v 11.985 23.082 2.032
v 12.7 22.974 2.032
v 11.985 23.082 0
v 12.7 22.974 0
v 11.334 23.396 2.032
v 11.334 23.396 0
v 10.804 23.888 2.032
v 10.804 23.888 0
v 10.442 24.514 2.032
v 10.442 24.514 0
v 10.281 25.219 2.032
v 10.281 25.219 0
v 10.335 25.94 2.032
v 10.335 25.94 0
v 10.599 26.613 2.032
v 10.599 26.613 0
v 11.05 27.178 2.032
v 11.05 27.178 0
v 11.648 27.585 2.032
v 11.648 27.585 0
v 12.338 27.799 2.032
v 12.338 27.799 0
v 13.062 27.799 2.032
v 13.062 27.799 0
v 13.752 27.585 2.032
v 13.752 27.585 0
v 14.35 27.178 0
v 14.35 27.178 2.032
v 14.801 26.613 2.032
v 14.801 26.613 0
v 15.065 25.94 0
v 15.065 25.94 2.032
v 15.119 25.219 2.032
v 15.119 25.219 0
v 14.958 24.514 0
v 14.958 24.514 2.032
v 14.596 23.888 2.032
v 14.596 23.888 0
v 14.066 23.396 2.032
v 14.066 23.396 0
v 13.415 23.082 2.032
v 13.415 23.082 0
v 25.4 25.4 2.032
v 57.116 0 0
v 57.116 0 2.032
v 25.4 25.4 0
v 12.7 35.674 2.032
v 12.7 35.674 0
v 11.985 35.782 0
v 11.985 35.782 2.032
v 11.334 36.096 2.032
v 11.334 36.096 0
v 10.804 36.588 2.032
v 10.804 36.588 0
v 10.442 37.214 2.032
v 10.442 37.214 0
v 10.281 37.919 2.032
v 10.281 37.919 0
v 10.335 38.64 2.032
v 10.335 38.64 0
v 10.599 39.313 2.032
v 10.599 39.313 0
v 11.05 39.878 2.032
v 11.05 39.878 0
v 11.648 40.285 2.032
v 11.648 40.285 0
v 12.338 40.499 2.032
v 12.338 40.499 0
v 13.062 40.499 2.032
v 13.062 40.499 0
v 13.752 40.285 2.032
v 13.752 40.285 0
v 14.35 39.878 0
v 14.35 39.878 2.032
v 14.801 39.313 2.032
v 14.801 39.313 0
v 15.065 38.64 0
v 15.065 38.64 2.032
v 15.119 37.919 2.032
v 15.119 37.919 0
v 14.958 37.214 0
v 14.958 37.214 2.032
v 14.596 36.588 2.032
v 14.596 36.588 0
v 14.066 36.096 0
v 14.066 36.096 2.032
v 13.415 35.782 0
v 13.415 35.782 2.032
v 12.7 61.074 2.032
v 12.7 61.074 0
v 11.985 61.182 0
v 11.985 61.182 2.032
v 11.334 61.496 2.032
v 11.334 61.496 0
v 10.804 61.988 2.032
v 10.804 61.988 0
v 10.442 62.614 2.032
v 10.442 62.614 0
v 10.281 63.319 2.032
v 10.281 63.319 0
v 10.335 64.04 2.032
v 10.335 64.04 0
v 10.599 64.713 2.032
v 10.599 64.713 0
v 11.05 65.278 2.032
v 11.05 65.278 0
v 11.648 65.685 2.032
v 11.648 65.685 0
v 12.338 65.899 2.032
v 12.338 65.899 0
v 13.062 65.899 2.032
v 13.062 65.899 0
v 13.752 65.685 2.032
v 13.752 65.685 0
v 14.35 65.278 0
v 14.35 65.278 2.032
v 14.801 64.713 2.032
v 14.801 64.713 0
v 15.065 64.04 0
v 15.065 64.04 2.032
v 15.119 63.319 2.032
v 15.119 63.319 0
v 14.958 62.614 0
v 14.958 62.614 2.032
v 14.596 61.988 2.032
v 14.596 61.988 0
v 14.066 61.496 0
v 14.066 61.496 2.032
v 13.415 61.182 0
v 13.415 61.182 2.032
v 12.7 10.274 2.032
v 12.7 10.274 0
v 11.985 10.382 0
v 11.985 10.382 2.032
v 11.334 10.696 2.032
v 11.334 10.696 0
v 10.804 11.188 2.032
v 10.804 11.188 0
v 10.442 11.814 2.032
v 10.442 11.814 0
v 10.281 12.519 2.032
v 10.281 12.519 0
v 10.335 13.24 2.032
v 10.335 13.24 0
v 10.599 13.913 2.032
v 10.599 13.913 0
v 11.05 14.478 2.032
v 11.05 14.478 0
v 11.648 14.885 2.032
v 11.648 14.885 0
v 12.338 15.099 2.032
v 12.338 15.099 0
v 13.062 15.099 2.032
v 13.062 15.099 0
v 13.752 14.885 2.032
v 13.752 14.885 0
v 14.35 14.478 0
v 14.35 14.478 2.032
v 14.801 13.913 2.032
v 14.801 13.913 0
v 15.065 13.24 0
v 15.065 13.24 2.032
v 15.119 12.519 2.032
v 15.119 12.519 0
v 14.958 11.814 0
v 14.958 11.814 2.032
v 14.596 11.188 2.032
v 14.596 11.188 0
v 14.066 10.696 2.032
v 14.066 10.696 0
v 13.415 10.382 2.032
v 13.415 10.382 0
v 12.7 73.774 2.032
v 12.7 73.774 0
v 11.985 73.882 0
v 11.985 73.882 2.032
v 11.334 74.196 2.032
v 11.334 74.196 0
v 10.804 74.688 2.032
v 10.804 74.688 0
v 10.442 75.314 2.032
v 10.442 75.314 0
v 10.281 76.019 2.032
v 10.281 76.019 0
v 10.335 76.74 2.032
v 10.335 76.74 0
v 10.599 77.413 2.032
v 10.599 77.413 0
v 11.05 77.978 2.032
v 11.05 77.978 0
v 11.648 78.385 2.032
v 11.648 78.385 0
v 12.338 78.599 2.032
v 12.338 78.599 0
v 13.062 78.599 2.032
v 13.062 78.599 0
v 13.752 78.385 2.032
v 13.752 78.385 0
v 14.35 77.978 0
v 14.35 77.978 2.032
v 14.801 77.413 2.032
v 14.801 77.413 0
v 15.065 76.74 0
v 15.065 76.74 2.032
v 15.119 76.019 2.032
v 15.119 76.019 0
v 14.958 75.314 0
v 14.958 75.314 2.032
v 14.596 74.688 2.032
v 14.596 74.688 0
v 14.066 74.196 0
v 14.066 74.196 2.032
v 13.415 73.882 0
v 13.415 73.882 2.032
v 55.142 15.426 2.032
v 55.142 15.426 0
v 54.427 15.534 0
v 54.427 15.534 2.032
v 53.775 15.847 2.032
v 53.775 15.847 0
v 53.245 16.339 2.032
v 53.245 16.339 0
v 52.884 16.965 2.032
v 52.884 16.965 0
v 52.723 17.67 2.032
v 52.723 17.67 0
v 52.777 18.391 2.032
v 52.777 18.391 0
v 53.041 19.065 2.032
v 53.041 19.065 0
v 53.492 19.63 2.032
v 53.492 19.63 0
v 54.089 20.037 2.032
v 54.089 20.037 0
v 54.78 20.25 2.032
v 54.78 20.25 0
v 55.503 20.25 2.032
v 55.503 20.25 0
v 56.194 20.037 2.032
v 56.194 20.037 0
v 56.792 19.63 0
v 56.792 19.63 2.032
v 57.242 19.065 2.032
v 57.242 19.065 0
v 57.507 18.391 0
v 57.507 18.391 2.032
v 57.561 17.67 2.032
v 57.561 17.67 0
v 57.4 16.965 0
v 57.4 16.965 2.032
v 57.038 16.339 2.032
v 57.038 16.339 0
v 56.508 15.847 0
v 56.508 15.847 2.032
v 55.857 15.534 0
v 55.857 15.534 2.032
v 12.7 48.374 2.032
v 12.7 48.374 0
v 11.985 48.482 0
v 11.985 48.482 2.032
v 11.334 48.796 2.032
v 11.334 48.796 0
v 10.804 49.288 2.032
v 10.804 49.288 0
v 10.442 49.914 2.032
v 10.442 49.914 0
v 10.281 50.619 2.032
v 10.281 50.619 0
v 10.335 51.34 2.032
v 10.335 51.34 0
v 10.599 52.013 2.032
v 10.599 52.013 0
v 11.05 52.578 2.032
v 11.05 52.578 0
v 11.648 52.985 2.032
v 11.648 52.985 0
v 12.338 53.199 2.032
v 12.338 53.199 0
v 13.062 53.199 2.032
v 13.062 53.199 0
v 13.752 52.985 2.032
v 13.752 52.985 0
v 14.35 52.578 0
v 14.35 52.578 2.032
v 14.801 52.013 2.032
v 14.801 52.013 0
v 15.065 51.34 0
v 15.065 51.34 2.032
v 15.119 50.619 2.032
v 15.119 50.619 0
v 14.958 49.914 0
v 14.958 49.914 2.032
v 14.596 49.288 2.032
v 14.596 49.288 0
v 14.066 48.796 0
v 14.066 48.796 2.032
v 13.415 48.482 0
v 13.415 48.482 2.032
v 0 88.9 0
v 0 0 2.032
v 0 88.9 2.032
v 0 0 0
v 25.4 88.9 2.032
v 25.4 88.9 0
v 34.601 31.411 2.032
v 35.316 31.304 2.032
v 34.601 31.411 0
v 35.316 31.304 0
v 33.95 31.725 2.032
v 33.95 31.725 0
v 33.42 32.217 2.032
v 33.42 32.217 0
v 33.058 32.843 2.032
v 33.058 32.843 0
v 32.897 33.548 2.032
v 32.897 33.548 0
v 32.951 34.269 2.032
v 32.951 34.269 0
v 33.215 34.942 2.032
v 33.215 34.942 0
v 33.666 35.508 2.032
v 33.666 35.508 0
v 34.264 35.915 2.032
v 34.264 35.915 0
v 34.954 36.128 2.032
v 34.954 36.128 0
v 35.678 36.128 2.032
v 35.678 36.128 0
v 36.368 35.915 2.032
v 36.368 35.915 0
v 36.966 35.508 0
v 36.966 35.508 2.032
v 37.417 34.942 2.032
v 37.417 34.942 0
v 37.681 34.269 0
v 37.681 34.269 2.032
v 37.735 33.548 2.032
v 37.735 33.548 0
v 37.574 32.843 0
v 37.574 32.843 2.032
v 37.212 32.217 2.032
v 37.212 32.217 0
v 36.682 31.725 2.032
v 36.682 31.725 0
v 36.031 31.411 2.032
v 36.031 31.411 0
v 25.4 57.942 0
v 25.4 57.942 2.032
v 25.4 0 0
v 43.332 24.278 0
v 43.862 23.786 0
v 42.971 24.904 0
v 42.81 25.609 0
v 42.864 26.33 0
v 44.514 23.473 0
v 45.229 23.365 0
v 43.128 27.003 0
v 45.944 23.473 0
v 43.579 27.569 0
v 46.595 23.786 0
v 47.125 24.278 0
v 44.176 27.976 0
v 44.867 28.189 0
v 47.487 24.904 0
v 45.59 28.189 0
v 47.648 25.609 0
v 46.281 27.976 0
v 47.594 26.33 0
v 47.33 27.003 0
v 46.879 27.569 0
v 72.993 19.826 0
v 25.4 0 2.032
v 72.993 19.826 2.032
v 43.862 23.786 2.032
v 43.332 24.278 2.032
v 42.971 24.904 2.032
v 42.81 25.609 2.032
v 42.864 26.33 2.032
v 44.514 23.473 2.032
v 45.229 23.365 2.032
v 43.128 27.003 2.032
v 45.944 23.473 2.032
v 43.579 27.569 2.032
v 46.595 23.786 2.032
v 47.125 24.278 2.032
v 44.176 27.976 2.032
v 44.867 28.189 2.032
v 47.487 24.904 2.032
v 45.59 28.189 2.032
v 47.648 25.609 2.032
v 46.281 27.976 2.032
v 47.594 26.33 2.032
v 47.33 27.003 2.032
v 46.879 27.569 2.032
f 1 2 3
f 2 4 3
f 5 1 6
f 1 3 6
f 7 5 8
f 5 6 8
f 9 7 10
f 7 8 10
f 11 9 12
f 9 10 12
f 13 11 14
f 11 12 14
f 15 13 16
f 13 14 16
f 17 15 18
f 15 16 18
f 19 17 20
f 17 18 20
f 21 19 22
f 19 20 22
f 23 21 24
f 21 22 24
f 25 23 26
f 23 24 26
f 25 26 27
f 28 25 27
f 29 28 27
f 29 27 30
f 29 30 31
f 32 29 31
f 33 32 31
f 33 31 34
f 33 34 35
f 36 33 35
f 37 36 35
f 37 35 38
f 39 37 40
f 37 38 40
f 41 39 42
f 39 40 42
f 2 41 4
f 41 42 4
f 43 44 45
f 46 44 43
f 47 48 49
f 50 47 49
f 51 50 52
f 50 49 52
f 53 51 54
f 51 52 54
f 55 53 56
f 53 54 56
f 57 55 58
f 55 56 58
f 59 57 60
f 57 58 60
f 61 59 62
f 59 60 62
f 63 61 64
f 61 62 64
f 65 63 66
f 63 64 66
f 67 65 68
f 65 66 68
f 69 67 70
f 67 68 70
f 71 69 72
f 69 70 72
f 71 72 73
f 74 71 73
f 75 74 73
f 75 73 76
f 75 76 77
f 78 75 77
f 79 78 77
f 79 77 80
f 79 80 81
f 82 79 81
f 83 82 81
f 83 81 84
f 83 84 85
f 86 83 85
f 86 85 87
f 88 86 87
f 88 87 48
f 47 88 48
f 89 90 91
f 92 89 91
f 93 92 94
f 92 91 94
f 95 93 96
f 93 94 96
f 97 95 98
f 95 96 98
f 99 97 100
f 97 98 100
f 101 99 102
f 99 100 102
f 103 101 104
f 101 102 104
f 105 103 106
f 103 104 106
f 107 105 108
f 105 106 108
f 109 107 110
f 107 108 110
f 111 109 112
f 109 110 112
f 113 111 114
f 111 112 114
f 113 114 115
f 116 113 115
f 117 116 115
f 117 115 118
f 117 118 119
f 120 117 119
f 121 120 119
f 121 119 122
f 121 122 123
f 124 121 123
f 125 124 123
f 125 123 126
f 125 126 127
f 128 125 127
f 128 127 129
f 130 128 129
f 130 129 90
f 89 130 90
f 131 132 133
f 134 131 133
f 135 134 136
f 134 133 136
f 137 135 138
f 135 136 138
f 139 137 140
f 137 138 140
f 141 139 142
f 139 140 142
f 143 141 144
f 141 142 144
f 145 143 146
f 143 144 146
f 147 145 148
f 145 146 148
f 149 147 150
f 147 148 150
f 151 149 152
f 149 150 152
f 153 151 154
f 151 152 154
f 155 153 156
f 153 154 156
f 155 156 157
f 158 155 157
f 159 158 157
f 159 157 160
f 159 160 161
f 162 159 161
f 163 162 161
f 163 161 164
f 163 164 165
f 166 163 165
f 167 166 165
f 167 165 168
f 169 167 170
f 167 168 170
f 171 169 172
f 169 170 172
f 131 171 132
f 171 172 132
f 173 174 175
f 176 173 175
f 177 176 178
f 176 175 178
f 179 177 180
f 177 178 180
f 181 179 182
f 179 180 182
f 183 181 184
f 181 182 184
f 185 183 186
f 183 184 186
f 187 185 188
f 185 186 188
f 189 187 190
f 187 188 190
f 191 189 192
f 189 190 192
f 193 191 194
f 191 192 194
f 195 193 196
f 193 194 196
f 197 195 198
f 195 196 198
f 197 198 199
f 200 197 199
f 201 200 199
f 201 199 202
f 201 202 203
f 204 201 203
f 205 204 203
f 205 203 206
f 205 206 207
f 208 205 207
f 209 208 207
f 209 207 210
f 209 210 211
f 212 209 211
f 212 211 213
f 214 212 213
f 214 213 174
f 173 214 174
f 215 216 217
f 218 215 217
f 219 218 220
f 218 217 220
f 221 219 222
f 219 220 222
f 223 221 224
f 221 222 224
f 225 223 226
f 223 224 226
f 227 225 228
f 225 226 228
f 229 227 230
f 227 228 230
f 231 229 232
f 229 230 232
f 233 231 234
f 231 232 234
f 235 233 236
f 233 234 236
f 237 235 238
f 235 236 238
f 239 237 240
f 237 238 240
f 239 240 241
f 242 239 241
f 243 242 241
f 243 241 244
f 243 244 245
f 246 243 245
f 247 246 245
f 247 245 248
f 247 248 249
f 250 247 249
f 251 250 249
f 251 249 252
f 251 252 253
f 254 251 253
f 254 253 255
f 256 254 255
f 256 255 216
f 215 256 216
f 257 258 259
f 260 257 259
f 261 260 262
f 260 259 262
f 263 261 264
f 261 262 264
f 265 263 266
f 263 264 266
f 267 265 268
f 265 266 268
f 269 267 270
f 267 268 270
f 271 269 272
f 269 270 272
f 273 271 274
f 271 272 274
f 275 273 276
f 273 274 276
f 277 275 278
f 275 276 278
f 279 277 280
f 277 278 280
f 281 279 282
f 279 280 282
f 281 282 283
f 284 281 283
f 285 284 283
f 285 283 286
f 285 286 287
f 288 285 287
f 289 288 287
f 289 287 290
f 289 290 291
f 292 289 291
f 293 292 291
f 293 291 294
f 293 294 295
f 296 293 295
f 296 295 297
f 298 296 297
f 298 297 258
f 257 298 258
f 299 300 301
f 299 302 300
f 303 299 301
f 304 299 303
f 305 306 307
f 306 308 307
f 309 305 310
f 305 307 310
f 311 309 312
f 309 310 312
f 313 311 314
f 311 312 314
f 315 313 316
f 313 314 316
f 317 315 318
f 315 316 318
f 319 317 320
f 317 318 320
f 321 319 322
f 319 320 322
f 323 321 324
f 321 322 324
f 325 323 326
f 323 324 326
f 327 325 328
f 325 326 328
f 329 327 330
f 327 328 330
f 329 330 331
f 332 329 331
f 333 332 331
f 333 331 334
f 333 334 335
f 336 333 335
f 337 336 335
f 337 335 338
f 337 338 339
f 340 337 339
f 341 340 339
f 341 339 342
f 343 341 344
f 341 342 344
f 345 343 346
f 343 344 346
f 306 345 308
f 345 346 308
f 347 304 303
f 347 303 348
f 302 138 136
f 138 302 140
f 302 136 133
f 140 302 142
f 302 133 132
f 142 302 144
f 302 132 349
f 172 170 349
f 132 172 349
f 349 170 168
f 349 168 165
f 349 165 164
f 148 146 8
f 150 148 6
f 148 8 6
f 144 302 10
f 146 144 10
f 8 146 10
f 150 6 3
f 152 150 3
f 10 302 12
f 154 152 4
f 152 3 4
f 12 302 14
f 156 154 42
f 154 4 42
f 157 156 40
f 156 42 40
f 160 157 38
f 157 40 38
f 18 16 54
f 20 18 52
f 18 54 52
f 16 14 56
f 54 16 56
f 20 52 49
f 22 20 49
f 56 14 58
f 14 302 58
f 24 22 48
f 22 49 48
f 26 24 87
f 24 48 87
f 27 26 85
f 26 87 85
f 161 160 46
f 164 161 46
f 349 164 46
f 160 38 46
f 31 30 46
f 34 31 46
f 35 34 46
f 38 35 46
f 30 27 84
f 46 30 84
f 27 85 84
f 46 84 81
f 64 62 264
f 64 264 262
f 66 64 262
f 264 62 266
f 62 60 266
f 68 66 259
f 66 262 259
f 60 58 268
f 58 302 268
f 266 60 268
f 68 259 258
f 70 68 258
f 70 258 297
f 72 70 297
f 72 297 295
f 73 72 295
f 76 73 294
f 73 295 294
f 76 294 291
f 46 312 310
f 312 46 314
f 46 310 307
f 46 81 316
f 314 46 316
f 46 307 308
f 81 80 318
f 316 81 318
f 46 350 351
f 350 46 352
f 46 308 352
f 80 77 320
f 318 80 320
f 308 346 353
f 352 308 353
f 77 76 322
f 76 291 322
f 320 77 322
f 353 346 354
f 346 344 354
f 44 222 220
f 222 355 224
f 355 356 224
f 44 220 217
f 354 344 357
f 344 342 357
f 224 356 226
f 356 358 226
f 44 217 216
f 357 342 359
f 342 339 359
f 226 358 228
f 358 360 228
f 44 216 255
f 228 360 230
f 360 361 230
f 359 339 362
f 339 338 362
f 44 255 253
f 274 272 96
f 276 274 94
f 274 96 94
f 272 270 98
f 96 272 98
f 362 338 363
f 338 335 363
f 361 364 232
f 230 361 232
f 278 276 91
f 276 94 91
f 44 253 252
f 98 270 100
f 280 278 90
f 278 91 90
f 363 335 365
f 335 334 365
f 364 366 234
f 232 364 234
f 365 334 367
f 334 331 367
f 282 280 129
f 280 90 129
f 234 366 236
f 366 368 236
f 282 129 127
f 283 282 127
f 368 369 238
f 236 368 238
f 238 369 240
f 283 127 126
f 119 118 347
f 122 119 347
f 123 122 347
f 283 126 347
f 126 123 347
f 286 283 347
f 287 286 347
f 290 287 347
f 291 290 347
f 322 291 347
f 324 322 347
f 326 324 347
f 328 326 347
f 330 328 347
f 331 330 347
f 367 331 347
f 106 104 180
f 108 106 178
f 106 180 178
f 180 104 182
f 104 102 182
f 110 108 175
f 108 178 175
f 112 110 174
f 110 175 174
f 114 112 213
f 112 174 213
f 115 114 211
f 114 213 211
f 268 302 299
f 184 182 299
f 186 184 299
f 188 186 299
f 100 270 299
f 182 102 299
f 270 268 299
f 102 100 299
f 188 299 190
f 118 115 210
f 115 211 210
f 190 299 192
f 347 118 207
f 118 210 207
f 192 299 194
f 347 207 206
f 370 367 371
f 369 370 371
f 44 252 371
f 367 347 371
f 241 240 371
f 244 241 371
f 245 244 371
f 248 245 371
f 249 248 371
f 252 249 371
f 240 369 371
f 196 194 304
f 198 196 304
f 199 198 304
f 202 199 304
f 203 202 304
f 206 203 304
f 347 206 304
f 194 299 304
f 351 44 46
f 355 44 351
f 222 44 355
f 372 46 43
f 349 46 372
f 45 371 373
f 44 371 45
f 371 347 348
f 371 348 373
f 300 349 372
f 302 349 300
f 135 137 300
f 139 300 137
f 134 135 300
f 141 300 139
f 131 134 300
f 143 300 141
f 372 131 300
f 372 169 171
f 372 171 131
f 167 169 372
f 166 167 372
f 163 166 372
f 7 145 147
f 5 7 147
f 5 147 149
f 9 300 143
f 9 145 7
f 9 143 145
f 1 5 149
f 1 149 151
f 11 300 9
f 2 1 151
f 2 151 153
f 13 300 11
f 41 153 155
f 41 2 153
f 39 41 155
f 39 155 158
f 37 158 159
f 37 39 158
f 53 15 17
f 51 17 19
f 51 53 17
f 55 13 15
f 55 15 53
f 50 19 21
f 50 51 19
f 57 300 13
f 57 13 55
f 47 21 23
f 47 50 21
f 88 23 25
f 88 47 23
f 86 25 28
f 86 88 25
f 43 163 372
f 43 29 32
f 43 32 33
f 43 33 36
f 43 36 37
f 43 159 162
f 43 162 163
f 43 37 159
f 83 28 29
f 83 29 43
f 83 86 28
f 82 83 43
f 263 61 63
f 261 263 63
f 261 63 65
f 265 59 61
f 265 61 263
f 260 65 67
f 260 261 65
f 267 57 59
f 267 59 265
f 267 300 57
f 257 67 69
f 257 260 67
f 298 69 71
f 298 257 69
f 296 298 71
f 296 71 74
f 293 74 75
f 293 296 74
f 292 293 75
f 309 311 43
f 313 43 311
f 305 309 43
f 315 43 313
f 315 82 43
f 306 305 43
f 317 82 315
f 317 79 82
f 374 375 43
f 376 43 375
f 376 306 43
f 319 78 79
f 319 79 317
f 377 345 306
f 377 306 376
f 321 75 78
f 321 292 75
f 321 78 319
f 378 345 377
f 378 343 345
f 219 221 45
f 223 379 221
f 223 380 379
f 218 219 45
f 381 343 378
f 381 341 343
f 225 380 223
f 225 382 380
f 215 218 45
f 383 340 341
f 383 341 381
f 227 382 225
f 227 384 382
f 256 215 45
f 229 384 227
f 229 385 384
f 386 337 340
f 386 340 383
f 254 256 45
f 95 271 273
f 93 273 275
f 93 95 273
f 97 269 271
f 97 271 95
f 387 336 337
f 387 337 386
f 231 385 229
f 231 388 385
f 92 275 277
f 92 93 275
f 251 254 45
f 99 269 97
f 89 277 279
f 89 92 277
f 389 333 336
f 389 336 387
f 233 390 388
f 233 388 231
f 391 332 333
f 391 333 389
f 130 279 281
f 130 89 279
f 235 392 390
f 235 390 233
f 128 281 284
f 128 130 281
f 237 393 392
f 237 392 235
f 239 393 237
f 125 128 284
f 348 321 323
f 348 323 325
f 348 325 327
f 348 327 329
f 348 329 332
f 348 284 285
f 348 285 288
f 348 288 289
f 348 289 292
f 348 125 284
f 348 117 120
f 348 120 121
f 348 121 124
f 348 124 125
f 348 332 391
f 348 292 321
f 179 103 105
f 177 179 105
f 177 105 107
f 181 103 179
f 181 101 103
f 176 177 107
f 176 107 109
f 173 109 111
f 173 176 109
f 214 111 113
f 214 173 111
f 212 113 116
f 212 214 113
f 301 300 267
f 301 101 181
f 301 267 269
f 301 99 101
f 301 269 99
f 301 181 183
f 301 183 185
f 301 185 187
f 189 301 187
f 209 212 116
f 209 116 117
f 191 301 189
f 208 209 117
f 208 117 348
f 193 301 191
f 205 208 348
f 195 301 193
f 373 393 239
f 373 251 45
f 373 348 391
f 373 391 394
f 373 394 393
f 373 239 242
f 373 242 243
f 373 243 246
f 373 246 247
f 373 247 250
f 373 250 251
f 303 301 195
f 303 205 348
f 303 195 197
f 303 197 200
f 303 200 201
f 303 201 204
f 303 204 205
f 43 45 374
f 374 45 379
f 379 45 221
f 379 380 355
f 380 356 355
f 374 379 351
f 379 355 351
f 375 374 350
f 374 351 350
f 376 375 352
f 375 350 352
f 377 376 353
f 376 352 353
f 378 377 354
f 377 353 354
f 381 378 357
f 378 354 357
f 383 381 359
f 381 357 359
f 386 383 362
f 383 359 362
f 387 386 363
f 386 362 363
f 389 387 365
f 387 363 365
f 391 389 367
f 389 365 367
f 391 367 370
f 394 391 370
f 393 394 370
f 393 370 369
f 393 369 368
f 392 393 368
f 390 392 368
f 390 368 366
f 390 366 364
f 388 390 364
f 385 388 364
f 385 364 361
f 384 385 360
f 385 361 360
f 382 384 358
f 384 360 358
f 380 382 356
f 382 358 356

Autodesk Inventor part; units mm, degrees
ref_plane "YZ Plane" through (0, 0, 0) normal (1, 0, 0) x (0, 1, 0)
ref_plane "XZ Plane" through (0, 0, 0) normal (0, 1, 0) x (-1, 0, 0)
ref_plane "XY Plane" through (0, 0, 0) normal (0, 0, 1) x (1, 0, 0)
sketch "Sketch1" plane through (0, 0, 0) normal (0, 0, 1) x (1, 0, 0)
  line L0 (0, 0) -> (0, 88.9)
  line L1 (0, 88.9) -> (25.4, 88.9)
  line L2 (25.4, 88.9) -> (25.4, 57.9416)
  line L3 (25.4, 57.9416) -> (72.9934, 19.8257)
  line L4 (72.9934, 19.8257) -> (57.1157, 0)
  line L5 (57.1157, 0) -> (25.4, 25.4)
  line L6 (25.4, 25.4) -> (25.4, 0)
  line L7 (25.4, 0) -> (0, 0)
  dimension "d0" = 25.4
  dimension "d1" = 25.4
  dimension "d3" = 25.4
  dimension "d5" = 51.31
  dimension "d18" = 88.9
extrude "Extrusion1" add sketch "Sketch1" along normal blind 2.032
sketch "Sketch3" plane through (0, 0, 2.032) normal (0, 0, 1) x (1, 0, 0)
  line L0 (25.4, 57.9416) -> (25.4, 88.9) projected
  line L1 (0, 0) -> (25.4, 0) projected
  line L2 (72.9934, 19.8257) -> (25.4, 57.9416) projected
  line L3 (57.1157, 0) -> (72.9934, 19.8257) projected
  point P0 (12.7, 12.7)
  point P1 (12.7, 25.4)
  point P2 (12.7, 38.1)
  point P3 (12.7, 50.8)
  point P4 (12.7, 63.5)
  point P5 (12.7, 76.2)
  point P6 (55.1417, 17.8517)
  point P7 (45.2289, 25.7906)
  point P8 (35.316, 33.7294)
  dimension "d8" = 12.7
  dimension "d9" = 12.7
  dimension "d10" = 12.7
  dimension "d11" = 12.7
  dimension "d12" = 12.7
  dimension "d13" = 12.7
  dimension "d14" = 12.7
  dimension "d19" = 12.7
  dimension "d20" = 12.7
  dimension "d21" = 12.7
  dimension "d23" = 12.7
  dimension "d24" = 12.7
  dimension "d25" = 12.7
hole "Hole1" at (12.7, 12.7, 2.032) at (12.7, 25.4, 2.032) at (12.7, 38.1, 2.032) at (12.7, 50.8, 2.032) at (12.7, 63.5, 2.032) at (12.7, 76.2, 2.032) at (55.1417, 17.8517, 2.032) at (45.2289, 25.7906, 2.032) at (35.316, 33.7294, 2.032) direction (0, 0, -1) diameter 4.8514 end through all
equation "\"d10\" = d9"
equation "\"d11\" = d9"
equation "\"d12\" = d9"
equation "\"d13\" = d9"
equation "\"d14\" = d9"
equation "\"d20\" = d19"
equation "\"d21\" = d19"
equation "\"d23\" = d9"
equation "\"d24\" = d9"
equation "\"d25\" = d9"
properties part number "SUP_011_Top4BarBarGusset" material "Aluminum 6061"
